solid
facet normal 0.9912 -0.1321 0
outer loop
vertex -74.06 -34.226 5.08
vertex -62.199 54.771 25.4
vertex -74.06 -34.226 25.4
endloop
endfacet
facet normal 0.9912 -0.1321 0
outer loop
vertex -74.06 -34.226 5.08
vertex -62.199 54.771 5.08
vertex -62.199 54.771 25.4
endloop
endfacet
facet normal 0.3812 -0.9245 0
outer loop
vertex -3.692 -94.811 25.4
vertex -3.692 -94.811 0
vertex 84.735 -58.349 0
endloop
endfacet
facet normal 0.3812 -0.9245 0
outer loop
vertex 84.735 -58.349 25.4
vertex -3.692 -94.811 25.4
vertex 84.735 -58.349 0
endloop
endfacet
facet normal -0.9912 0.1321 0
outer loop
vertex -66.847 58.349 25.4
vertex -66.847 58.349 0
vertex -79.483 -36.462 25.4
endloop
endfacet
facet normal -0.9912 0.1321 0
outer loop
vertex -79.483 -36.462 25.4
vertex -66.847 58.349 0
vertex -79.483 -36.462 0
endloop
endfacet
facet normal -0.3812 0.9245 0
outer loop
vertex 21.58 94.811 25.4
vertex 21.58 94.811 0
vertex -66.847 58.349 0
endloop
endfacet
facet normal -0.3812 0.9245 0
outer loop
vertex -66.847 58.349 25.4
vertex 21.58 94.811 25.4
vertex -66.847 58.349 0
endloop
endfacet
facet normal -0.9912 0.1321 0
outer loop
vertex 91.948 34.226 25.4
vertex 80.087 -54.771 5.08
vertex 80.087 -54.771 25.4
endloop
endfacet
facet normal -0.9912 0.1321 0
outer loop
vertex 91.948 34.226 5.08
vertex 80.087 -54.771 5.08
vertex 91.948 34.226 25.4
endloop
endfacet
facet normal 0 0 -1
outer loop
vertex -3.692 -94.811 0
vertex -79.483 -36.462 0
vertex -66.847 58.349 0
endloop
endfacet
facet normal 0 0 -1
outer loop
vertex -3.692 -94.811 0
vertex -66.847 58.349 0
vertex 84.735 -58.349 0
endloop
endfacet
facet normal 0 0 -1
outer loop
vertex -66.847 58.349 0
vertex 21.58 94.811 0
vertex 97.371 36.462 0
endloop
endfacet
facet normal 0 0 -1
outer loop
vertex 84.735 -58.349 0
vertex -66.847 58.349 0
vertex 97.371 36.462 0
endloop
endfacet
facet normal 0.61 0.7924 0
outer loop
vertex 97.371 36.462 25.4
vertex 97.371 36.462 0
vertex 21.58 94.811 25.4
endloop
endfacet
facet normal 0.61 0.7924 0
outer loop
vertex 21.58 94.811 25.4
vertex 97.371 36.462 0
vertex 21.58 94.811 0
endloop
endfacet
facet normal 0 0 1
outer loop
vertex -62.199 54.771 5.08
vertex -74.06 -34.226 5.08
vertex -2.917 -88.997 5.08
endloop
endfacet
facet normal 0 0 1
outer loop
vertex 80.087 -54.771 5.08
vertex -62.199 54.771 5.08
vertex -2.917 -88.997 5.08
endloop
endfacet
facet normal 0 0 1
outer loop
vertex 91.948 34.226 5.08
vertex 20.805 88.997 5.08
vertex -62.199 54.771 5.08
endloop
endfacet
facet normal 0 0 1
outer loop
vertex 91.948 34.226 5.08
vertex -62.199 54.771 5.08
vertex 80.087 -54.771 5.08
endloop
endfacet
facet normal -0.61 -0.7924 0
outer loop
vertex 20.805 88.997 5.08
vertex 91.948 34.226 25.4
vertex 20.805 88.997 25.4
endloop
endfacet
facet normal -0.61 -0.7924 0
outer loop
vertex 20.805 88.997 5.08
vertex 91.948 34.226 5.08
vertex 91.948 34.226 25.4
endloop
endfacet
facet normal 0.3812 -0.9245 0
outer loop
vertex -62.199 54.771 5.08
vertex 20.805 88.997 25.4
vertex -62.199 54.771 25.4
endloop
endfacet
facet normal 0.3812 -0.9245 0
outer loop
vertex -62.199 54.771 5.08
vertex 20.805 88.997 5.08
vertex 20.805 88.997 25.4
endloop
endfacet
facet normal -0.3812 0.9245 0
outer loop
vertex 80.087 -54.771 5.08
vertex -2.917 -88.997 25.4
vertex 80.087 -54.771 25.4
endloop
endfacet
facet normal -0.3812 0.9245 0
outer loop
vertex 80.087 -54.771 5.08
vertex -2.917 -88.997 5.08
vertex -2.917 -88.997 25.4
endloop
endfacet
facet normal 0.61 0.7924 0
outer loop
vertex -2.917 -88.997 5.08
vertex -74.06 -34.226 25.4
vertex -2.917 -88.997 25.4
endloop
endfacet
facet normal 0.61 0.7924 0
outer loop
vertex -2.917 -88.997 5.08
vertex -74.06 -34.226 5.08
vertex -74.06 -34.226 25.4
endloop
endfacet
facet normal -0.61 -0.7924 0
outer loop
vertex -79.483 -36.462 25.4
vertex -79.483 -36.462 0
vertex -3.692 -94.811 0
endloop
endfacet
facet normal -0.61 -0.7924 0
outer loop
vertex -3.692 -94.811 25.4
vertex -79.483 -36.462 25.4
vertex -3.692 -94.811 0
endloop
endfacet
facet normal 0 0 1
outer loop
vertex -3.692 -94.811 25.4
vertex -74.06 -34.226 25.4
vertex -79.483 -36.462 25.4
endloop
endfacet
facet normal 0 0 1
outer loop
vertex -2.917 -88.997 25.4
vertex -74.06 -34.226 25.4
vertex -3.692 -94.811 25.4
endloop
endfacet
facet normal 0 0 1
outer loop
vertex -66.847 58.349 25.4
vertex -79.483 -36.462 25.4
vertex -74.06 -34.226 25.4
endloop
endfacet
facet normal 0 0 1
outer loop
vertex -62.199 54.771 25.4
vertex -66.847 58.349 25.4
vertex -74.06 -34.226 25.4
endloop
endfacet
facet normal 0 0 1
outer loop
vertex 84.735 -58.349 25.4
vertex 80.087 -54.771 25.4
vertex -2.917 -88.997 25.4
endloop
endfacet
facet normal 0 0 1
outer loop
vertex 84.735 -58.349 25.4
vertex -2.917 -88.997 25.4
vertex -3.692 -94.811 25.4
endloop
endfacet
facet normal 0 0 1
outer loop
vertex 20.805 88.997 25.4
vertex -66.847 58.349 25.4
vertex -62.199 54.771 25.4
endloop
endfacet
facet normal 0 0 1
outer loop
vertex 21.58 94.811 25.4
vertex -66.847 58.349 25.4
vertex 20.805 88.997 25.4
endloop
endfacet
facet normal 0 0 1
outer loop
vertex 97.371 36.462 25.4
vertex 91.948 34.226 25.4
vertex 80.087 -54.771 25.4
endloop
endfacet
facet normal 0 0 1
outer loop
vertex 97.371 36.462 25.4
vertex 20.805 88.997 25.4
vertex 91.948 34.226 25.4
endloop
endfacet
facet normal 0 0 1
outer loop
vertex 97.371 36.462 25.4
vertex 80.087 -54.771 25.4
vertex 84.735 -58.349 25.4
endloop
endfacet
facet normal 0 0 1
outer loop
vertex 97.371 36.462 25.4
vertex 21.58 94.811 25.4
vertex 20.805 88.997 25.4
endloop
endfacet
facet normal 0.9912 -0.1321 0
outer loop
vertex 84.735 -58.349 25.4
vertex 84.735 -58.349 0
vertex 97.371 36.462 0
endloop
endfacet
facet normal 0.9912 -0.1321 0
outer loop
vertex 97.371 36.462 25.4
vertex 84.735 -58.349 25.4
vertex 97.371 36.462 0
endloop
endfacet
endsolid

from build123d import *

# Parameters (mm, degrees)
F1_DEPTH = 25.4
F2_T     = -5.08


with BuildPart() as f1:
    # F0 (on Top) → F1 (new body)
    with BuildSketch(Plane.XY):
        Polygon((84.735168, -58.349015), (97.371386, 36.462443), (21.580365, 94.811458), (-66.846875, 58.349015), (-79.483094, -36.462443), (-3.692072, -94.811458), align=None)
    extrude(amount=F1_DEPTH)

    # F2
    f2_openings = [f1.faces().sort_by_distance(p)[0] for p in [
        (8.944146, 0, 25.4),
    ]]
    offset(amount=F2_T, openings=f2_openings)


solid = f1.part
